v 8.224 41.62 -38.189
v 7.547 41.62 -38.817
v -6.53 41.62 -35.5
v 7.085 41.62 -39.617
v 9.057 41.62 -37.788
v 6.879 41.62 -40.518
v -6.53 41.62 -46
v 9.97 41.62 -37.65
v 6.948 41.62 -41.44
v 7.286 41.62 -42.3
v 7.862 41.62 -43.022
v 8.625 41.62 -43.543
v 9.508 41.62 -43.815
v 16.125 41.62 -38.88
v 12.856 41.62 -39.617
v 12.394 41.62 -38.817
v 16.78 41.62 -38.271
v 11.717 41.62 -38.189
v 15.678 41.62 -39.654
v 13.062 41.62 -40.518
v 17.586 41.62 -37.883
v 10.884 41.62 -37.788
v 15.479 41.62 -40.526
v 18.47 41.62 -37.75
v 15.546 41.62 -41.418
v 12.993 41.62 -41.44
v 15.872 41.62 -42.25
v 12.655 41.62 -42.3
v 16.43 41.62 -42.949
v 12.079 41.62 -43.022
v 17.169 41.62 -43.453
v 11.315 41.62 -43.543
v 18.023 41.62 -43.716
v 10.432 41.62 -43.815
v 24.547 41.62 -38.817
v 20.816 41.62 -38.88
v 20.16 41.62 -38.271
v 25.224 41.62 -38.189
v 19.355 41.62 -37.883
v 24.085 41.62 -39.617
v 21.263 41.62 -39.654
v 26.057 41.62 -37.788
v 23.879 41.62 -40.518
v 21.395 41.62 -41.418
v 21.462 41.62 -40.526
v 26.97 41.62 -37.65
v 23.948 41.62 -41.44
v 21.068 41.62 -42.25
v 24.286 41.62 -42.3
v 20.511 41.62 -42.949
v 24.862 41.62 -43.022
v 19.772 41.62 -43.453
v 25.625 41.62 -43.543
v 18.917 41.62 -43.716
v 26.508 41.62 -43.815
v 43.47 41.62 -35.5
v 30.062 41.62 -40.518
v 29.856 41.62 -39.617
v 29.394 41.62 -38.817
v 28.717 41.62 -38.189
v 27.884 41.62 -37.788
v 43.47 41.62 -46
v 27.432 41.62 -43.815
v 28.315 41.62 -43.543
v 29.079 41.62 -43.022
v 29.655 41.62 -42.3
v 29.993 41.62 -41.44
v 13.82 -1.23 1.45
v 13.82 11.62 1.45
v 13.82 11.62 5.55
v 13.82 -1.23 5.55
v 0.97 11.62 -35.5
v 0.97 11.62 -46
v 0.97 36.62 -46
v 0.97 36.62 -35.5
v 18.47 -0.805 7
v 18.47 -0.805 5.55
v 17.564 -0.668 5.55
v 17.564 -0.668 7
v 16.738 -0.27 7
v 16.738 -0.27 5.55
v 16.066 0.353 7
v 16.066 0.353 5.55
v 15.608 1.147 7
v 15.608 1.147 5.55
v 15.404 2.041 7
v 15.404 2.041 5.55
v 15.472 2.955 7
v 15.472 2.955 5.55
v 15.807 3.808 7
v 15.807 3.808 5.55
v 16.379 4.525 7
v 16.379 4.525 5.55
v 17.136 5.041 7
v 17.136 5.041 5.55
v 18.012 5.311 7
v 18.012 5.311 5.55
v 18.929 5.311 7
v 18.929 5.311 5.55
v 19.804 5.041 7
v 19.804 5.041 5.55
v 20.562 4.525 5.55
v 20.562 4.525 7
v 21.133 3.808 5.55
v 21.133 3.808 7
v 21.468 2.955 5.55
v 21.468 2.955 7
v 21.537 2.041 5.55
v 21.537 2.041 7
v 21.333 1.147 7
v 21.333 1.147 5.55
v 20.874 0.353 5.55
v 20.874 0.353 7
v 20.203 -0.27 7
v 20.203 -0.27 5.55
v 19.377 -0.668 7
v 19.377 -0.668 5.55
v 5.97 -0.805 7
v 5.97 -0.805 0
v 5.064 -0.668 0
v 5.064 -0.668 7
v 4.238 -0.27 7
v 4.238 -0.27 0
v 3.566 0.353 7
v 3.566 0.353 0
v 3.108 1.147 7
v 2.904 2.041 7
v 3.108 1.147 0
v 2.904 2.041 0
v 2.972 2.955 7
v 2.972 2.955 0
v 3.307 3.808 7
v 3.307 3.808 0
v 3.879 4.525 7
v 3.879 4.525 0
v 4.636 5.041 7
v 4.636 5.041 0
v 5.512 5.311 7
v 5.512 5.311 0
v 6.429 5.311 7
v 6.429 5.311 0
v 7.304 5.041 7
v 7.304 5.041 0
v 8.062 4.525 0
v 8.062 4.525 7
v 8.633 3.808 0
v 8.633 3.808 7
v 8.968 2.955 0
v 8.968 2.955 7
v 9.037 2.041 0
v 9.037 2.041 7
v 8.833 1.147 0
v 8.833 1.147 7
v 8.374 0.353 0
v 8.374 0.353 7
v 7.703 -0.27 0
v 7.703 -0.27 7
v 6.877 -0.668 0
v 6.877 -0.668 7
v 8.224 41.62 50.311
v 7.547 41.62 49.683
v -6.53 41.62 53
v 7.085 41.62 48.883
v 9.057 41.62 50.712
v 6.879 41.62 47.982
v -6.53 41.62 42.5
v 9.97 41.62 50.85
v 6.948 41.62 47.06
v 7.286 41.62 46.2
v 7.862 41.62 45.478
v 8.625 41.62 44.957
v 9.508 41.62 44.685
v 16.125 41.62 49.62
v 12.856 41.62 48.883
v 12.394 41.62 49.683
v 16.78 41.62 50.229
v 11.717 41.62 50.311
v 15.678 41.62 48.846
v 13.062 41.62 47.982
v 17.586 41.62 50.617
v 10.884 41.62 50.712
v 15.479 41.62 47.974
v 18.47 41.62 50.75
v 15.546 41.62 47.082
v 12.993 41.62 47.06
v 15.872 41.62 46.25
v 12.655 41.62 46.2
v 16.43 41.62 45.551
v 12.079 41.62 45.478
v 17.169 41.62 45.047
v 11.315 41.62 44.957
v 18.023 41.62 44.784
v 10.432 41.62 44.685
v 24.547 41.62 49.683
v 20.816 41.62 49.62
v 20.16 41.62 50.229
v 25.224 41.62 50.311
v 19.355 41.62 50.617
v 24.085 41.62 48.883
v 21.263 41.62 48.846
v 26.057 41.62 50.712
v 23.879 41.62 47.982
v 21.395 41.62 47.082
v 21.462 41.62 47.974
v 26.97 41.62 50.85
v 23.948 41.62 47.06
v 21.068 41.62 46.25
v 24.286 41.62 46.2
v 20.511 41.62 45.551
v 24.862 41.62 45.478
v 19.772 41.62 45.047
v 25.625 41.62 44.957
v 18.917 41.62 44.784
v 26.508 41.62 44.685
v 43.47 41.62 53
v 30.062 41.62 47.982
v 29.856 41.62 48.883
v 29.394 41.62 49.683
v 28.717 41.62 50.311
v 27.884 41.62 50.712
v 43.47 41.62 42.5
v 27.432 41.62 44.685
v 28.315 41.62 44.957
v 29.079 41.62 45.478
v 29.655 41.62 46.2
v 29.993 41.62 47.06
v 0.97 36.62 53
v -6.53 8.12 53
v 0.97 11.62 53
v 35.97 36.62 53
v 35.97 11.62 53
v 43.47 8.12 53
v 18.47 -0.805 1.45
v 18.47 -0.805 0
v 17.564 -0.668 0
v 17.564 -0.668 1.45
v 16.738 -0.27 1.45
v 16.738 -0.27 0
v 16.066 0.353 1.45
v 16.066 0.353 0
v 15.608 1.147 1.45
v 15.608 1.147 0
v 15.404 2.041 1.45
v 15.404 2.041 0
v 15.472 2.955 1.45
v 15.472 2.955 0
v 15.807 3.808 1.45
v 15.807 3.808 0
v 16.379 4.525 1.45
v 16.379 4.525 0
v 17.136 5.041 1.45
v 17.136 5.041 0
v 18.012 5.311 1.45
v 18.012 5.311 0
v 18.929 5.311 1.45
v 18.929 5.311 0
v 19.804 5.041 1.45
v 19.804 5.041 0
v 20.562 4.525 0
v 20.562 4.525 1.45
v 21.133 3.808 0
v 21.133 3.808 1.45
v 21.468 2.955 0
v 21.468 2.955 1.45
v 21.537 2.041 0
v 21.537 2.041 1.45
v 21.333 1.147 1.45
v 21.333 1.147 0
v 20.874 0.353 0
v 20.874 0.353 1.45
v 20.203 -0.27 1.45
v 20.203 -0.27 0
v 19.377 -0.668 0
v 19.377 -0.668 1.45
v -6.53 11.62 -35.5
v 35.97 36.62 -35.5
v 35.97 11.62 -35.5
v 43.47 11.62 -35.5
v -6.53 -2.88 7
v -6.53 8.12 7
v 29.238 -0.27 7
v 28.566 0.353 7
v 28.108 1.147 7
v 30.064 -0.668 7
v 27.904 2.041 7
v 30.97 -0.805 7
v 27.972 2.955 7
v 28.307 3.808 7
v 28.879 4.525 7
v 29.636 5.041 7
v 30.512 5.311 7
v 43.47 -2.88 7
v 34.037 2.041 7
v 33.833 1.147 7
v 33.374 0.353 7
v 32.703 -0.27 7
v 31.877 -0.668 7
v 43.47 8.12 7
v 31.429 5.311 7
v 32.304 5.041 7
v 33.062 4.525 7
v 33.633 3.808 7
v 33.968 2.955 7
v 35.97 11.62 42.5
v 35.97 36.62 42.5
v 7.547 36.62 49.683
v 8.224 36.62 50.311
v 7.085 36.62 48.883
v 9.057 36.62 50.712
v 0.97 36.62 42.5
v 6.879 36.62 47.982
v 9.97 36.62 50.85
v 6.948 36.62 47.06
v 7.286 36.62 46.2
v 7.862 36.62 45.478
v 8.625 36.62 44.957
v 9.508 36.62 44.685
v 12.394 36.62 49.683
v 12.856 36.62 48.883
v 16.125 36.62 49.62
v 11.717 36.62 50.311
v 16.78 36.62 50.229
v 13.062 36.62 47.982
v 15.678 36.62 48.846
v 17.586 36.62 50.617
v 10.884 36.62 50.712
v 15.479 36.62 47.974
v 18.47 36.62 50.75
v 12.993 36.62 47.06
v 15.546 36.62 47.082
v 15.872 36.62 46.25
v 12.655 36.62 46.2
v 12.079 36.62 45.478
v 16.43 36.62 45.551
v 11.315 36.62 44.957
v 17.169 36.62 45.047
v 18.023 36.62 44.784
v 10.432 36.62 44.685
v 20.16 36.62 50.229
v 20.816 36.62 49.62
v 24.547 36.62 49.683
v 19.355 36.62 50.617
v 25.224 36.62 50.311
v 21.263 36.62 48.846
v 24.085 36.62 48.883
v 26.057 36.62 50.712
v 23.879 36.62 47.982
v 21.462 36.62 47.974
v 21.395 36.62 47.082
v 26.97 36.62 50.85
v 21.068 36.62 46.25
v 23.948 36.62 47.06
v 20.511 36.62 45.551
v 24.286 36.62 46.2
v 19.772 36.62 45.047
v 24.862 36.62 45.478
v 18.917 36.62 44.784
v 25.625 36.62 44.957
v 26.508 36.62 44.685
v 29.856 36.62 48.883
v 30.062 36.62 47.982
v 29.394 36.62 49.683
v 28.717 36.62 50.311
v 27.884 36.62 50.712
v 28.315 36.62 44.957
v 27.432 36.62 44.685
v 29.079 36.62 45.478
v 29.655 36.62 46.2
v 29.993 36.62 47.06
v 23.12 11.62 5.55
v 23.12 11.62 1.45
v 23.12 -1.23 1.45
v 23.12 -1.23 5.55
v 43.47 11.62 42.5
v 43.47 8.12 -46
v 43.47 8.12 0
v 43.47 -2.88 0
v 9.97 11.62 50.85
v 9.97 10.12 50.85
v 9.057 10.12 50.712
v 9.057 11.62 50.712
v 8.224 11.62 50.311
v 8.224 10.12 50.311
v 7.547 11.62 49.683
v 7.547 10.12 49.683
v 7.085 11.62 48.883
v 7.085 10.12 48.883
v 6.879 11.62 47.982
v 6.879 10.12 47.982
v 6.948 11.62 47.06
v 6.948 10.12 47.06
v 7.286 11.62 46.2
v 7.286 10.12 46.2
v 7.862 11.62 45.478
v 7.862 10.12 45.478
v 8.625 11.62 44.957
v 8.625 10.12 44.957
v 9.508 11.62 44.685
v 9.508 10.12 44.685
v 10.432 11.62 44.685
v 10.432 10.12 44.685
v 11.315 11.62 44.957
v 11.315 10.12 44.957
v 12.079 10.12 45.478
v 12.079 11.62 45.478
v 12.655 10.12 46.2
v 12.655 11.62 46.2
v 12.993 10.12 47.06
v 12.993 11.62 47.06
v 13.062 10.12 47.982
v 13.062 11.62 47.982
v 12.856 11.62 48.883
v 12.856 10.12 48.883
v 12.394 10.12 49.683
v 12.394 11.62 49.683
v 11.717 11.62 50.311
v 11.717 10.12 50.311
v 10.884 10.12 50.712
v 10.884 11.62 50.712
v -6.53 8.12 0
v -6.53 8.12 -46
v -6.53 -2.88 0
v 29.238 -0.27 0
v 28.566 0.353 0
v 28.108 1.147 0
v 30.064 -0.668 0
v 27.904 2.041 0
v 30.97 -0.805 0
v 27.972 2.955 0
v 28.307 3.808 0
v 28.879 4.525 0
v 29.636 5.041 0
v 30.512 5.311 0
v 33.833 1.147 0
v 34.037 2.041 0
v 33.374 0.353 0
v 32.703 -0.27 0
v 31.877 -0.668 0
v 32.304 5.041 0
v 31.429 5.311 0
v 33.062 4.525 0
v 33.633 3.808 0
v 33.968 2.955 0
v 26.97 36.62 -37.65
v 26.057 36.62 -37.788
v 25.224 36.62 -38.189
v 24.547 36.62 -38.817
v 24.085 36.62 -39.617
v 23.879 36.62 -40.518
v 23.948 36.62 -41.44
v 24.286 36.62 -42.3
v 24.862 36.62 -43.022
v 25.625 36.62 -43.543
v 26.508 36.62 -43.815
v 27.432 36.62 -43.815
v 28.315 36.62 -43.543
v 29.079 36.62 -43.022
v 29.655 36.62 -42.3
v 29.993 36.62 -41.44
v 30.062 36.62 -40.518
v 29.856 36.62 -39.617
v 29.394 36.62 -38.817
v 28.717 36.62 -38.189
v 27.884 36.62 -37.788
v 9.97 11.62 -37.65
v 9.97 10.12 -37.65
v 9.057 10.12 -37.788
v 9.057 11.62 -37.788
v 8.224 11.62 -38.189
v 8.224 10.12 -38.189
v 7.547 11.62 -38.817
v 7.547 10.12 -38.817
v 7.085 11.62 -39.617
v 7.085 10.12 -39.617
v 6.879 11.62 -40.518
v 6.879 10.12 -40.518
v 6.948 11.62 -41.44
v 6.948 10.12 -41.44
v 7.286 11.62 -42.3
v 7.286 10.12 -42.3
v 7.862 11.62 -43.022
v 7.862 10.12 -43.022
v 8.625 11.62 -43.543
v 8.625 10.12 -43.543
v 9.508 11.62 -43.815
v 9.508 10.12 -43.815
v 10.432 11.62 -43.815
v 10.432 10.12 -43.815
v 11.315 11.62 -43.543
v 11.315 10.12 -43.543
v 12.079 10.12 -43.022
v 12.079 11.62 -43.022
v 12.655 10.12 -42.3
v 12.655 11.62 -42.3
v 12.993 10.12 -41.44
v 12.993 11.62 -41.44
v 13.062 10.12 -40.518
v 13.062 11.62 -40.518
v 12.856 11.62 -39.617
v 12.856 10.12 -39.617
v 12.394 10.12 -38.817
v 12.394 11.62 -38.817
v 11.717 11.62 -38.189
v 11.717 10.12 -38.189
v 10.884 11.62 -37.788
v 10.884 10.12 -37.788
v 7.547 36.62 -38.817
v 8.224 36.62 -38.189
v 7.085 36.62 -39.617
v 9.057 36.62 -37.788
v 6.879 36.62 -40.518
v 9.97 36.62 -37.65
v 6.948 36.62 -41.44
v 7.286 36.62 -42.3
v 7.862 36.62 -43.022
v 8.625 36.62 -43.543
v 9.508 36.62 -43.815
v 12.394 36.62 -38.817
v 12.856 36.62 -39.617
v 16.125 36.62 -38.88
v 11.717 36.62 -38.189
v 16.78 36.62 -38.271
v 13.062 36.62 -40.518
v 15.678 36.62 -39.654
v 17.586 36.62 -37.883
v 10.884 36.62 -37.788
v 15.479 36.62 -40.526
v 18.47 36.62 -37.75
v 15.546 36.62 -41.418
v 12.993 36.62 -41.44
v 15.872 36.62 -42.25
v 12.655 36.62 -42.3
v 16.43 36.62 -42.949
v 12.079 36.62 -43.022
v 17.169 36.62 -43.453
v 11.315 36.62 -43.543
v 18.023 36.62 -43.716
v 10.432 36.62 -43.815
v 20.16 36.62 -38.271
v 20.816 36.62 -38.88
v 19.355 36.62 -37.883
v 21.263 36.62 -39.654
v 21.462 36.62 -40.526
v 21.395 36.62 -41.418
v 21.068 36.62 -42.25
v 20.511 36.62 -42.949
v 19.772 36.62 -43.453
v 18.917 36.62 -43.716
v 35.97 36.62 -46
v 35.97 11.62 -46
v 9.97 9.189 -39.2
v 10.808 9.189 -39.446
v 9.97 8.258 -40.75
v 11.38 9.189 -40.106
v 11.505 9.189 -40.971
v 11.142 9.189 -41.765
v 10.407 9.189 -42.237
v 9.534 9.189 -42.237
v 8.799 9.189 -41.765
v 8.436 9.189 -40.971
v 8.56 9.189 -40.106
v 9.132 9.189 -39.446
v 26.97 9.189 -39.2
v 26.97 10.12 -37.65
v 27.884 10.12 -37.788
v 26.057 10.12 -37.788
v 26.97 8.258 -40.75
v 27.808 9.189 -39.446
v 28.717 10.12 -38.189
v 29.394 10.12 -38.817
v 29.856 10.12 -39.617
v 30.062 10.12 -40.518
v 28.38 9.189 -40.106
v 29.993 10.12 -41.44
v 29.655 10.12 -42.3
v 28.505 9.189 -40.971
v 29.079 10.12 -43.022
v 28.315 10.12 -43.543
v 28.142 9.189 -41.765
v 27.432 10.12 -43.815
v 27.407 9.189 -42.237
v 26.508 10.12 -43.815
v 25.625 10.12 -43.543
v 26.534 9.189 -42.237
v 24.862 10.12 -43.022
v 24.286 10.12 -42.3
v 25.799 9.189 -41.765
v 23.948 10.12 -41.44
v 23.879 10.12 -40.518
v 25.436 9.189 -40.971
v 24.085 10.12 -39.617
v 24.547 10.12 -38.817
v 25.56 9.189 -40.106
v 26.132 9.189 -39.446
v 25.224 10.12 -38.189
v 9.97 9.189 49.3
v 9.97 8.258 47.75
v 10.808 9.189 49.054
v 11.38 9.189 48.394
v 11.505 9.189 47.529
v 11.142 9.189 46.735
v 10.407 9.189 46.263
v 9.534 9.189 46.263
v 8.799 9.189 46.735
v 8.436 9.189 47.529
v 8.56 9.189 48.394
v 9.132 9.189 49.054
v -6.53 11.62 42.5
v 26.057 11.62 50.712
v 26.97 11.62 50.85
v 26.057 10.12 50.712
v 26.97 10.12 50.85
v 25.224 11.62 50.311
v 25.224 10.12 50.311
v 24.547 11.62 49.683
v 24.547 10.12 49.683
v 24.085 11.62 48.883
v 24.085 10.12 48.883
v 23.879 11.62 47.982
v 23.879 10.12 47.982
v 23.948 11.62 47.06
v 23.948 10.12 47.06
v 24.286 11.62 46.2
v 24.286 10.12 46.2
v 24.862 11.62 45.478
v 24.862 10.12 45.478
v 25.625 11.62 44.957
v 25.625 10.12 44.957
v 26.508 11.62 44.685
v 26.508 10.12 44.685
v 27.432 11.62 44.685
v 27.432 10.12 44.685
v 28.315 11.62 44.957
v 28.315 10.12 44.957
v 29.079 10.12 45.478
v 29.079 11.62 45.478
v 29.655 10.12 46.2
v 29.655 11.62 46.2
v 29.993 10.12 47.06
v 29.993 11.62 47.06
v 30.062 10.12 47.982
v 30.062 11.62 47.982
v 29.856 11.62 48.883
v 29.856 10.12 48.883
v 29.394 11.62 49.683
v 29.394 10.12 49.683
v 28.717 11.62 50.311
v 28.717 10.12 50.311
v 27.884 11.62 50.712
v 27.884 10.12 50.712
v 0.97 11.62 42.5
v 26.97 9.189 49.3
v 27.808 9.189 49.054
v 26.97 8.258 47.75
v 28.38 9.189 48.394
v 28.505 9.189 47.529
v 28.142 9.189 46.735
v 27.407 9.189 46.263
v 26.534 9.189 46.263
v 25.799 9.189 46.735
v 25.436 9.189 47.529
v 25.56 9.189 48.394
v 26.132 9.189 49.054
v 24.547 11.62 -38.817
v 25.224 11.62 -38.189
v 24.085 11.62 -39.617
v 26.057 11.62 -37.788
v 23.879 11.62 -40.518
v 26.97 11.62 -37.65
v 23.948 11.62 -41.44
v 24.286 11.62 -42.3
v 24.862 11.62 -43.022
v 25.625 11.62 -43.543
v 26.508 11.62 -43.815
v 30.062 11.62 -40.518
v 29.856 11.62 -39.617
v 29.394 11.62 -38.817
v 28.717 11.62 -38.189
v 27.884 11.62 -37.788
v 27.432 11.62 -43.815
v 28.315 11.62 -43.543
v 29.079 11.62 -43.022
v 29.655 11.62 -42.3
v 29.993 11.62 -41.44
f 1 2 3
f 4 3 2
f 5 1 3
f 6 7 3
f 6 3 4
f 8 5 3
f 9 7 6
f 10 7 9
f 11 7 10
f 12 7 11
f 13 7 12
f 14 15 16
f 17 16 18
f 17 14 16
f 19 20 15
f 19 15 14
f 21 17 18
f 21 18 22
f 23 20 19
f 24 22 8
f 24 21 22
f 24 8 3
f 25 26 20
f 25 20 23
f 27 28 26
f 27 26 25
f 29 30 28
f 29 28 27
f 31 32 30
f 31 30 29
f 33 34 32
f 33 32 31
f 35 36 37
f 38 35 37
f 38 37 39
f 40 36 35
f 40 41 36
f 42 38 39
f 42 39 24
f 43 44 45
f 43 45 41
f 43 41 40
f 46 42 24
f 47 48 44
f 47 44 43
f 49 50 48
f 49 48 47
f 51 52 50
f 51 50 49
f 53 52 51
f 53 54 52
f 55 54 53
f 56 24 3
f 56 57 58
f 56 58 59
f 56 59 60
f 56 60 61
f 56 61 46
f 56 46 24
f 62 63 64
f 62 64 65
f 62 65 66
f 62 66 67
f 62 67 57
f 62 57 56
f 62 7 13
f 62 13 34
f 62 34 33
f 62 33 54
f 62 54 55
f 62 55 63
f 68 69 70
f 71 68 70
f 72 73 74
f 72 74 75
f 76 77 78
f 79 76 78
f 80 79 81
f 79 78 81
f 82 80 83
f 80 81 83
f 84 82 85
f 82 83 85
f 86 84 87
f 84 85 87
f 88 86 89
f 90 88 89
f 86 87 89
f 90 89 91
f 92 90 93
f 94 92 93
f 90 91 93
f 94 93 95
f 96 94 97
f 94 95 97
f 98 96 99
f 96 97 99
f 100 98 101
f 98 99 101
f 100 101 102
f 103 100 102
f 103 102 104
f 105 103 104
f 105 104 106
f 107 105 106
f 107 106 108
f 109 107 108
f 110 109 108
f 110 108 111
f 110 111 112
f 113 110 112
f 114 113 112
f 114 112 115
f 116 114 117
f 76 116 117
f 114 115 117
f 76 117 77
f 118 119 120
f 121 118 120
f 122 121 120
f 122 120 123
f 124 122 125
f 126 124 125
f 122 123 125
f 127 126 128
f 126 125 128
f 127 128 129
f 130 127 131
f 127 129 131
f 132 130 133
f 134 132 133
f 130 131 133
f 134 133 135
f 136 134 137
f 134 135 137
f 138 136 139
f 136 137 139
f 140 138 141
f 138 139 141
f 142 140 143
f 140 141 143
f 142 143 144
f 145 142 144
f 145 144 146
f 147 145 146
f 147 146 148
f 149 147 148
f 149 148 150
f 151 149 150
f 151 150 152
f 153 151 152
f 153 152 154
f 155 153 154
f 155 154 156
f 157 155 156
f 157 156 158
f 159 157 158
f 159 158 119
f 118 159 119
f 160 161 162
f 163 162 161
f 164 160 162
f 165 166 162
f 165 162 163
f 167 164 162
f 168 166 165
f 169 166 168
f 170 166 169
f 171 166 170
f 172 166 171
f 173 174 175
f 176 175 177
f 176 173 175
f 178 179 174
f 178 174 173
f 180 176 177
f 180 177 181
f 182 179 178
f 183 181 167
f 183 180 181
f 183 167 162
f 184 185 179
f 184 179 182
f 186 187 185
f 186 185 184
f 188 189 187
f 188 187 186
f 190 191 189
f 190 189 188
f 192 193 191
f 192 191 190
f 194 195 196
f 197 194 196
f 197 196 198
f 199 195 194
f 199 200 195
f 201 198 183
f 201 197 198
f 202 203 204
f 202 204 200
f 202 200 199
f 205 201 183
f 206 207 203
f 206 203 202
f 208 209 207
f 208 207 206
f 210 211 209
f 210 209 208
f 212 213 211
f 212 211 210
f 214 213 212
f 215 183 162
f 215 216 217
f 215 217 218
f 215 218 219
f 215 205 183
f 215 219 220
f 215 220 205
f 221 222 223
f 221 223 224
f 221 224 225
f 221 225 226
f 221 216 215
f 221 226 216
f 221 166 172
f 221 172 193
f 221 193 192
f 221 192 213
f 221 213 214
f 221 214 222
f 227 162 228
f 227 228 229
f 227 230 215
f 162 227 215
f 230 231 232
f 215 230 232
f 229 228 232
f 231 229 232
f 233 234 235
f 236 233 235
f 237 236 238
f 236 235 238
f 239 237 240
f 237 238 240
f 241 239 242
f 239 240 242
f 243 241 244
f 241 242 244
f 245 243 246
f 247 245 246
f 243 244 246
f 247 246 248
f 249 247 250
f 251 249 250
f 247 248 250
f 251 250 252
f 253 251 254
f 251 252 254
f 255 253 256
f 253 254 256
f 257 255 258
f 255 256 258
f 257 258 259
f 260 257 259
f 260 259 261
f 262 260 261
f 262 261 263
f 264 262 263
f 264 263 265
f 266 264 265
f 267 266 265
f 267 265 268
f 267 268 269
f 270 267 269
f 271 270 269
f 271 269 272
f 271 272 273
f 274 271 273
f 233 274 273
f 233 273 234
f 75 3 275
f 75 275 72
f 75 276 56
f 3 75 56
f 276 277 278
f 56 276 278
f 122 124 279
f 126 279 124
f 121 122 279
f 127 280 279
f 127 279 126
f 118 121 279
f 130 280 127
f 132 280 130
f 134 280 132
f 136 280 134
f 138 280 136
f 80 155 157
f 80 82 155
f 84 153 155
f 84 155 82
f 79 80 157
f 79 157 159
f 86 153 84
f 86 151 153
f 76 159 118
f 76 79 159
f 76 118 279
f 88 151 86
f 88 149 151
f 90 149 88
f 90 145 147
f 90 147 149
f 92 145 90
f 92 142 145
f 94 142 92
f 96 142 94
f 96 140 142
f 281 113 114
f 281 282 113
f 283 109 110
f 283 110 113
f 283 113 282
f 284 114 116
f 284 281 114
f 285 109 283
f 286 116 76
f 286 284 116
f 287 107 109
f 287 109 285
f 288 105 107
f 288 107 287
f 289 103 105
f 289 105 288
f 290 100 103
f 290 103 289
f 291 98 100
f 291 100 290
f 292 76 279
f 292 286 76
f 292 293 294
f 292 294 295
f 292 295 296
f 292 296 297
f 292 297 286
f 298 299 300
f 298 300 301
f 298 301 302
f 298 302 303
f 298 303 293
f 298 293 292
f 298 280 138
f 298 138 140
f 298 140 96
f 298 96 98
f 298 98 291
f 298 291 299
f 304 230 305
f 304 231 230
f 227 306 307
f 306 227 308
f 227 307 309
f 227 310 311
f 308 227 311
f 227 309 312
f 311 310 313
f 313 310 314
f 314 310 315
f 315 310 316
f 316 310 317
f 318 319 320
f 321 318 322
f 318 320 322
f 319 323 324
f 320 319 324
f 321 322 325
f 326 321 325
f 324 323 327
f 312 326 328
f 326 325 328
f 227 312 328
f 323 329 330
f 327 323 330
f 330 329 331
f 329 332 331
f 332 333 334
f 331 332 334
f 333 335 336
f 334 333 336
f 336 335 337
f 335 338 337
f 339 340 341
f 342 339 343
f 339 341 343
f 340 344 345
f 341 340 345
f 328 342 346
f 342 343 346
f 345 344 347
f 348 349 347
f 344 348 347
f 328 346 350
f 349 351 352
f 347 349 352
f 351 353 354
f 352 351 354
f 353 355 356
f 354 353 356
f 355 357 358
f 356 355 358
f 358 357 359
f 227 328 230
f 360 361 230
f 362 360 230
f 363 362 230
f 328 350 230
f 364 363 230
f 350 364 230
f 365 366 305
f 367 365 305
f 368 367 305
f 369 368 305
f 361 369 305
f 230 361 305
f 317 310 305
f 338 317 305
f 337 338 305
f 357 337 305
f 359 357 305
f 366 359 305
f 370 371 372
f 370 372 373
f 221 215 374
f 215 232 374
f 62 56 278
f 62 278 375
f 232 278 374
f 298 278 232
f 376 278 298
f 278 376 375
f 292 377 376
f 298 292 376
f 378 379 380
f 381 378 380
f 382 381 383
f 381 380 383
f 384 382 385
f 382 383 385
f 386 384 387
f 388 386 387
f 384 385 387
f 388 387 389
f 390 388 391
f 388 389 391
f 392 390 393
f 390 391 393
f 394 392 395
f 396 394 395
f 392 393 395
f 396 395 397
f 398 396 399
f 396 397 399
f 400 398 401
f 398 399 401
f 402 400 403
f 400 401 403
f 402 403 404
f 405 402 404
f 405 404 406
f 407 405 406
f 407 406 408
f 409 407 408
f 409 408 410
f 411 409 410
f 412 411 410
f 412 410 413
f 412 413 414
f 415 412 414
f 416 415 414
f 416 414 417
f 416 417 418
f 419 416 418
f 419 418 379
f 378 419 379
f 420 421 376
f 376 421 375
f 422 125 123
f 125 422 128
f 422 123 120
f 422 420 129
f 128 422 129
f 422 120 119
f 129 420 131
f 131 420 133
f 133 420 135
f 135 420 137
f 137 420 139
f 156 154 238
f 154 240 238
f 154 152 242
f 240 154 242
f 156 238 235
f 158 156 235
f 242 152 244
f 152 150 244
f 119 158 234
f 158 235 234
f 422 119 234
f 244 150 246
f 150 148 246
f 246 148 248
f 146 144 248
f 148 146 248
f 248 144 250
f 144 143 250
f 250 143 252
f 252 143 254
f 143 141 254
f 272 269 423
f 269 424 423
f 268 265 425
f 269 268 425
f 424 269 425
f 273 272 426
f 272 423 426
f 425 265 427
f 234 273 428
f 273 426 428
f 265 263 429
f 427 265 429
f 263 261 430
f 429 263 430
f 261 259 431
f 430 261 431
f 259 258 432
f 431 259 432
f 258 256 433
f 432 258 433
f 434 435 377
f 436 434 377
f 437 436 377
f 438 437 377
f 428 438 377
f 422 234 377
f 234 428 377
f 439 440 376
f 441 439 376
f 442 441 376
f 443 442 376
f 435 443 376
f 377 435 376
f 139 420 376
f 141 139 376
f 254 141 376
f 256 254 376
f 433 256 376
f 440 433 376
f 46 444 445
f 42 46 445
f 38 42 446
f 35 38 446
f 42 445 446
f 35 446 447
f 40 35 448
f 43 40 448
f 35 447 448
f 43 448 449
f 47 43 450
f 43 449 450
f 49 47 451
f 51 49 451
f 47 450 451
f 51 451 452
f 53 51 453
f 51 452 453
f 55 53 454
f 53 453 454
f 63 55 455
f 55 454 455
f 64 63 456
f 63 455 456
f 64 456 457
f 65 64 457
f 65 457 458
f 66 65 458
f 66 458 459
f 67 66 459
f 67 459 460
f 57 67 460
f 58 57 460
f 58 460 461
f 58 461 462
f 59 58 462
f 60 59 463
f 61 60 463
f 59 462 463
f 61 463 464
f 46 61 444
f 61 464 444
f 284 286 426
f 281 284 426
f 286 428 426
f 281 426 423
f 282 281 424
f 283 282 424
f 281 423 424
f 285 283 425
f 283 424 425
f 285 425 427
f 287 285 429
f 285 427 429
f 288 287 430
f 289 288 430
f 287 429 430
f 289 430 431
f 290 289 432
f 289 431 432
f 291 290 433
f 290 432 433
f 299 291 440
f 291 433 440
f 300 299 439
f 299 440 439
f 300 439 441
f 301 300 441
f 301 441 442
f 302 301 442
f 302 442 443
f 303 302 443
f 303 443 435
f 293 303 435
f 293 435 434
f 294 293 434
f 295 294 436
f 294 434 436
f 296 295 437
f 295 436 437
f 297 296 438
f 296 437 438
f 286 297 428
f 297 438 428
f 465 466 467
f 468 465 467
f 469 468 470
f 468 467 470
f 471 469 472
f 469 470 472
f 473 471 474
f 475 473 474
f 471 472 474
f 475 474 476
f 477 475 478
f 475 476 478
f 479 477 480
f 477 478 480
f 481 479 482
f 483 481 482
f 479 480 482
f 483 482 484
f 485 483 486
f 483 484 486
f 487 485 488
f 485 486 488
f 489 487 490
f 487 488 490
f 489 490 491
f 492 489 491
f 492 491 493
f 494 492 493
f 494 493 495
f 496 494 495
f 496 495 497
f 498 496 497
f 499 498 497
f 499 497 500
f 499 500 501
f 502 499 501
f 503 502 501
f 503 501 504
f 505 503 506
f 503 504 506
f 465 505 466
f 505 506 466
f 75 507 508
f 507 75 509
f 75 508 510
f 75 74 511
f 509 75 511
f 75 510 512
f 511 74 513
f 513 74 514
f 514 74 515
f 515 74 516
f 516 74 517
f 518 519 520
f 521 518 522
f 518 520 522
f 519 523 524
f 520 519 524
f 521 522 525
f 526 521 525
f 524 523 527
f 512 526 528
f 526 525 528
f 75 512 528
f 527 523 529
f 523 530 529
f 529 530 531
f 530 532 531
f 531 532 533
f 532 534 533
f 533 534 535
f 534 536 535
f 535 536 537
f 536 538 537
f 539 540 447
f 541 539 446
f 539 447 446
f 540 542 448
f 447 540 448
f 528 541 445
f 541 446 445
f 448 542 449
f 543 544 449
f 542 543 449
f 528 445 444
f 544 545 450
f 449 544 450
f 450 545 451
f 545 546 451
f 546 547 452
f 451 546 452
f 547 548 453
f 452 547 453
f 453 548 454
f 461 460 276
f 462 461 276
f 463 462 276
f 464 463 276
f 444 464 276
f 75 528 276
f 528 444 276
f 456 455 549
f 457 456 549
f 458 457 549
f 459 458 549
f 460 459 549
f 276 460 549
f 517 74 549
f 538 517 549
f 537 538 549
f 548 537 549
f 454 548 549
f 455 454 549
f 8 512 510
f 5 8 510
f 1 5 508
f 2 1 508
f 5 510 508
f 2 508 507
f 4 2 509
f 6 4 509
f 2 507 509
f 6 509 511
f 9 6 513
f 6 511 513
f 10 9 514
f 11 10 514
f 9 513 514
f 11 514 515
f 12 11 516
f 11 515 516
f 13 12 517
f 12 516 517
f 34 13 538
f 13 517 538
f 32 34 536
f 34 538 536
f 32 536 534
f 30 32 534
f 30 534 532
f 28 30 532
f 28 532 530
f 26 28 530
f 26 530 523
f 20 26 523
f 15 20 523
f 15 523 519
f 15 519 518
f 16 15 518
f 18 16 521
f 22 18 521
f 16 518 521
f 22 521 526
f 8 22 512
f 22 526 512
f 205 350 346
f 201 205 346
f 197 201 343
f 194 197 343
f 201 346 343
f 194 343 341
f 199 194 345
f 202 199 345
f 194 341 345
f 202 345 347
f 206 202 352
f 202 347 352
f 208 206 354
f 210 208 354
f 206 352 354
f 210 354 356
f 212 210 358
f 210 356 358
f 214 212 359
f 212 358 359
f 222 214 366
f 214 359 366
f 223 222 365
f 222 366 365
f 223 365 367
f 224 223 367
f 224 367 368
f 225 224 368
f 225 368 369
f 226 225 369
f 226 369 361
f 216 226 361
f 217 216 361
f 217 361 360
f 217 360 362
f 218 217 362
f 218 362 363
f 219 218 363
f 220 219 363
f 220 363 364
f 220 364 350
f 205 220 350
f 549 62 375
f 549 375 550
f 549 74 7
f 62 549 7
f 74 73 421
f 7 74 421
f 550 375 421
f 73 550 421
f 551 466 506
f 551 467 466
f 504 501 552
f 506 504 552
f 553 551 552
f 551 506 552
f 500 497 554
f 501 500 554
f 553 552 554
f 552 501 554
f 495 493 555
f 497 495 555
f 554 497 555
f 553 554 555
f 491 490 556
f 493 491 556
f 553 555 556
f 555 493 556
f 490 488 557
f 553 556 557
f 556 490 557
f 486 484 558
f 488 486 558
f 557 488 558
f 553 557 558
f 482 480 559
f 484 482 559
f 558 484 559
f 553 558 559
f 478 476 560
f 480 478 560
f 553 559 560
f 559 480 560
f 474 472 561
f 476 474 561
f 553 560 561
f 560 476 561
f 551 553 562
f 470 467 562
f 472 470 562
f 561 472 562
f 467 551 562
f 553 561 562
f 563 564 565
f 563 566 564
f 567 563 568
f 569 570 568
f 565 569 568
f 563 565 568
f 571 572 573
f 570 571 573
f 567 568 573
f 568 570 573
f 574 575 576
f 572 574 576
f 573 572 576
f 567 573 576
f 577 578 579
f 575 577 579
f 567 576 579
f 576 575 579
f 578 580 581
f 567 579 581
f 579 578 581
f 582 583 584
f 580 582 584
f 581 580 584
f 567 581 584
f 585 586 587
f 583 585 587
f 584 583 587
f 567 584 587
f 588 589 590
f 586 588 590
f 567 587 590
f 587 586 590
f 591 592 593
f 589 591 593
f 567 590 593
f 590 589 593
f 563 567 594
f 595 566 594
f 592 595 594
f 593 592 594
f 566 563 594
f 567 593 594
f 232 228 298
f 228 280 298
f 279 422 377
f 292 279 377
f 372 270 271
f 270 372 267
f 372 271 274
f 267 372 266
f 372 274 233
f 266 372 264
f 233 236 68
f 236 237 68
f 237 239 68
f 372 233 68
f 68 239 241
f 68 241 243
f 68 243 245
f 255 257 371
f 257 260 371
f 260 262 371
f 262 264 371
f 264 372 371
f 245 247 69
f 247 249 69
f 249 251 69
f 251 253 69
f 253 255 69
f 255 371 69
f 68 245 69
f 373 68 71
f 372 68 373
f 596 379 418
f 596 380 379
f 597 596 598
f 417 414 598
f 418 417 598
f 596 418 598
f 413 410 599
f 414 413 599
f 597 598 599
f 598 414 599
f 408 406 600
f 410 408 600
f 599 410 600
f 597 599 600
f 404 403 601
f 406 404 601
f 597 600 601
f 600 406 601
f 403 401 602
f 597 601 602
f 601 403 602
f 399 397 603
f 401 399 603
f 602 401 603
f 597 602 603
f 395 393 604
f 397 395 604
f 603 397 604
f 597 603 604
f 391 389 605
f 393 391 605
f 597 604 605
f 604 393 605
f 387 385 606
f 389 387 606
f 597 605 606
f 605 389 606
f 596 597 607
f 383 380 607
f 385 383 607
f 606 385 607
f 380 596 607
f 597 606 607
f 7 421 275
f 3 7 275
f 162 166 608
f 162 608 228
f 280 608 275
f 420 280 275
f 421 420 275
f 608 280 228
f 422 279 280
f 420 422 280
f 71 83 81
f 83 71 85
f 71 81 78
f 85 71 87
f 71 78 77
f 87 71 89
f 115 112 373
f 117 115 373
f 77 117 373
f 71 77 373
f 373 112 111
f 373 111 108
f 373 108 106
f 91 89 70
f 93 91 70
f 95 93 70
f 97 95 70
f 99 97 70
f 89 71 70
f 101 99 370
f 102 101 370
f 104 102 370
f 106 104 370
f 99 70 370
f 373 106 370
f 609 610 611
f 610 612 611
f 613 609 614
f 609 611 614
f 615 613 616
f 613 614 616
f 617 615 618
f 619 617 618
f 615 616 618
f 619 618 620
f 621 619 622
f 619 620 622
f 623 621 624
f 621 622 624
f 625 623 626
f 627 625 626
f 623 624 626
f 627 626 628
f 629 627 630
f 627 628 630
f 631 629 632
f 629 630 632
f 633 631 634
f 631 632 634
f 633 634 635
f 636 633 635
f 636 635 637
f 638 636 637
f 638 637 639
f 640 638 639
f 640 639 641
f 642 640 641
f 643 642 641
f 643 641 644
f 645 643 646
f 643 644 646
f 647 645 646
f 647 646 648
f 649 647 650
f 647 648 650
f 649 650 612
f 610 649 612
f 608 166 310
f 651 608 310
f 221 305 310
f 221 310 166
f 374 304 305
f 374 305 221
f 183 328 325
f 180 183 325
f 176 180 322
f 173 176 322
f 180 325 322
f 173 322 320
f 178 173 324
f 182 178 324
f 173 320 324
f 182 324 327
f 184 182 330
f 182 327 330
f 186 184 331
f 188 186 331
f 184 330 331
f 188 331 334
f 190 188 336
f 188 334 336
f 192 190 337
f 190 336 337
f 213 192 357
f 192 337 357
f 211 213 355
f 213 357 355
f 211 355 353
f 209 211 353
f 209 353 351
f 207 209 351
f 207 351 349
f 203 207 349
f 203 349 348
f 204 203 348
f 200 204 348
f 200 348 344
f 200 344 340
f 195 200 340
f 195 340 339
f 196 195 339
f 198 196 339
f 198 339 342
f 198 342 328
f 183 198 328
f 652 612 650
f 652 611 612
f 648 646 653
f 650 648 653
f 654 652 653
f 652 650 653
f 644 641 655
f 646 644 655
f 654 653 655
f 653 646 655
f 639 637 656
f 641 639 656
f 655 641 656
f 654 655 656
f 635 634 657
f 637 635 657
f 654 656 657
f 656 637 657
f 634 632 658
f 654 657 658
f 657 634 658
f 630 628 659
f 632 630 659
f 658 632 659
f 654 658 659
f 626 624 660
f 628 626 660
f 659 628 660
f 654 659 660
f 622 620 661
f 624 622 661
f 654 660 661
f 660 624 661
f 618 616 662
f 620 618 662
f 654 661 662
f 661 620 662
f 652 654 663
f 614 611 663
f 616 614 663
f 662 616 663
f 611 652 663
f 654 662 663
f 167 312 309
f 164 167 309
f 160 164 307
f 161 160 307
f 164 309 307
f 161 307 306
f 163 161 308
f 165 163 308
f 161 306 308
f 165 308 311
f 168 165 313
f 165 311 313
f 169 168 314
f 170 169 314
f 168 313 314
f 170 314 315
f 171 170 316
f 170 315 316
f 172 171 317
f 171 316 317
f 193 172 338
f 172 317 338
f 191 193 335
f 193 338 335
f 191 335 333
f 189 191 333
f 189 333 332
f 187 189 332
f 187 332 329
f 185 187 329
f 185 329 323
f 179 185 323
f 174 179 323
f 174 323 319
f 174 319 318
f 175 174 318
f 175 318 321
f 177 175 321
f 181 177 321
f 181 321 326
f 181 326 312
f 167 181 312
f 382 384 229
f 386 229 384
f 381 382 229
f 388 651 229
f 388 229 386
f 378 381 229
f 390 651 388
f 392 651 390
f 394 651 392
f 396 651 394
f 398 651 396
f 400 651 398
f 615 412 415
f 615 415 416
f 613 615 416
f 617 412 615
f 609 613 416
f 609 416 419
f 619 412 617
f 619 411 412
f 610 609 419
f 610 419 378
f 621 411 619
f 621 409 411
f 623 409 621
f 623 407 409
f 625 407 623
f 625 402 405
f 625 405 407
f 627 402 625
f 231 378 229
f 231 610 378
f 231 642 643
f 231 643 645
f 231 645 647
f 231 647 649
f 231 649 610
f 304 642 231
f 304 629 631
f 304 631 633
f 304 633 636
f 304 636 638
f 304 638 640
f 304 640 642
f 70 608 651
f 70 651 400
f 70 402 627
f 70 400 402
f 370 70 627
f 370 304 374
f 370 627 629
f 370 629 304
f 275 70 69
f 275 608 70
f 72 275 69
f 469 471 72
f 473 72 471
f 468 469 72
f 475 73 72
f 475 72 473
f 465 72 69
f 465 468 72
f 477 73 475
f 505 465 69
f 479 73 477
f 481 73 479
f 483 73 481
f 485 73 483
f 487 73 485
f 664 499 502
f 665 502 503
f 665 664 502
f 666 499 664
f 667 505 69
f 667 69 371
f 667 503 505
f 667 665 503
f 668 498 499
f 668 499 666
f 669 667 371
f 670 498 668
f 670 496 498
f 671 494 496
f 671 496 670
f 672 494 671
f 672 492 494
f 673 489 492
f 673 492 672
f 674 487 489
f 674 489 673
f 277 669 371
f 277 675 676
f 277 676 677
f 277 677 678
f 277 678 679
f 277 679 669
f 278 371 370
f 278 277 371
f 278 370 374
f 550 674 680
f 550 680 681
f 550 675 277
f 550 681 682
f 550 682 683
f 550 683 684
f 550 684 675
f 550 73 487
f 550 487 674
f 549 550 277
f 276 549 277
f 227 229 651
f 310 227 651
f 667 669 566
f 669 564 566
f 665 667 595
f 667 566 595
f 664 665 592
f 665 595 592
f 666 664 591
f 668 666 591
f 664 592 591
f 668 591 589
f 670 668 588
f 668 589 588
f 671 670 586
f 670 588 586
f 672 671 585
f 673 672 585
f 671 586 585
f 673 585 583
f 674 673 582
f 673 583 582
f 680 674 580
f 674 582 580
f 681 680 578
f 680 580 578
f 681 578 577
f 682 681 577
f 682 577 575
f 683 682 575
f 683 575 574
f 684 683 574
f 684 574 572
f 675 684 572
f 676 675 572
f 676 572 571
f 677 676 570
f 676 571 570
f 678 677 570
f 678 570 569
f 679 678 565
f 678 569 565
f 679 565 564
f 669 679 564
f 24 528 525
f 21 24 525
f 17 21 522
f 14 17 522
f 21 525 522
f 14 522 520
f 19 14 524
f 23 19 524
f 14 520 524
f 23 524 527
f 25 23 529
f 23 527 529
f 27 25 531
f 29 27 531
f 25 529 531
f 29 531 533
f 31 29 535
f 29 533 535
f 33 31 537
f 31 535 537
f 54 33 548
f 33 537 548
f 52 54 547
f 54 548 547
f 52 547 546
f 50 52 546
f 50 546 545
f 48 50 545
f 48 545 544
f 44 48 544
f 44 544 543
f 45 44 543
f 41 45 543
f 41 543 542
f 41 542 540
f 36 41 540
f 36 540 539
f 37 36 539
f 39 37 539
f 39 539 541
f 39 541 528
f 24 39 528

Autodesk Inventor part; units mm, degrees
ref_plane "YZ Plane" through (0, 0, 0) normal (1, 0, 0) x (0, 1, 0)
ref_plane "XZ Plane" through (0, 0, 0) normal (0, 1, 0) x (-1, 0, 0)
ref_plane "XY Plane" through (0, 0, 0) normal (0, 0, 1) x (1, 0, 0)
sketch "Skizze1" plane through (0, 0, 0) normal (0, 0, 1) x (1, 0, 0)
  line L0 (-6.5297, -2.8796) -> (43.4703, -2.8796)
  line L1 (43.4703, -2.8796) -> (43.4703, 8.1204)
  line L2 (43.4703, 8.1204) -> (-6.5297, 8.1204)
  line L3 (-6.5297, 8.1204) -> (-6.5297, -2.8796)
  point P0 (0, 0)
  dimension "d0" = 50
  dimension "d1" = 11
extrude "Extrusion1" add sketch "Skizze1" along normal blind 7
sketch "Skizze2" plane through (-6.5297, 8.1204, 0) normal (0, 1, 0) x (1, 0, 0)
  line L0 (29.65, -5.55) -> (20.35, -5.55)
  line L1 (20.35, -5.55) -> (20.35, -1.45)
  line L2 (20.35, -1.45) -> (29.65, -1.45)
  line L3 (29.65, -1.45) -> (29.65, -5.55)
  line L4 (50, -7) -> (0, -7) projected
  line L5 (50, 0) -> (50, -7) projected
  line L6 (0, 0) -> (0, -7) projected
  point P0 (6.5297, 0)
  dimension "d4" = 9.3
  dimension "d5" = 4.1
  dimension "d6" = 1.45
  dimension "d7" = 20.35
  dimension "d8" = 20.35
extrude "Extrusion2" cut sketch "Skizze2" against normal blind 9.35
sketch "Skizze3" plane through (0, 0, 7) normal (0, 0, 1) x (1, 0, 0)
  line L0 (-6.5297, 8.1204) -> (-6.5297, -2.8796) projected
  line L1 (43.4703, 8.1204) -> (-6.5297, 8.1204) projected
  point P0 (0, 0)
  point P1 (5.9703, 2.2704)
  point P2 (18.4703, 2.2704)
  point P3 (30.9703, 2.2704)
  dimension "d11" = 12.5
  dimension "d12" = 12.5
  dimension "d13" = 12.5
  dimension "d14" = 5.85
hole "Bohrung1" at (5.9703, 2.2704, 7) at (18.4703, 2.2704, 7) at (30.9703, 2.2704, 7) direction (0, 0, -1) diameter 6.15 end through all
sketch "Skizze4" plane through (-6.5297, 8.1204, 0) normal (0, 1, 0) x (1, 0, 0)
  point P0 (6.5297, 0)
sketch "Skizze5" plane through (-6.5297, 8.1204, 0) normal (0, 1, 0) x (1, 0, 0)
  line L0 (50, 0) -> (0, 0) projected
  line L1 (0, 0) -> (0, -53.0037)
  line L2 (0, -53) -> (50, -53)
  line L3 (50, -53) -> (50, 46)
  line L4 (50, 46) -> (0, 46)
  line L5 (0, 46) -> (0, -53)
  point P0 (6.5297, 0)
  dimension "d22" = 50
  dimension "d23" = 99
  dimension "d24" = 46
extrude "Extrusion3" add sketch "Skizze5" along normal blind 3.5
sketch "Skizze6" plane through (-6.5297, 11.6204, 0) normal (0, 1, 0) x (1, 0, 0)
  line L0 (29.65, -1.45) -> (29.65, -5.55) projected
  line L1 (29.65, -1.45) -> (20.35, -1.45)
  line L2 (20.35, -1.45) -> (20.35, -5.55)
  line L3 (20.35, -5.55) -> (29.65, -5.55)
  line L4 (29.65, -5.55) -> (29.65, -1.45)
  point P0 (6.5297, 0)
extrude "Extrusion4" cut sketch "Skizze6" against normal blind 3.5
sketch "Skizze7" plane through (-6.5297, 11.6204, 0) normal (0, 1, 0) x (1, 0, 0)
  line L0 (0, -53) -> (50, -53) projected
  line L1 (50, -53) -> (42.5, -53)
  line L2 (42.5, -53) -> (42.5, -42.5)
  line L3 (42.5, -42.5) -> (50, -42.5)
  line L4 (50, -42.5) -> (50, -53)
  line L5 (0, -53) -> (7.5, -53)
  line L6 (7.5, -53) -> (7.5, -42.5)
  line L7 (7.5, -42.5) -> (0, -42.5)
  line L8 (0, -42.5) -> (0, -53)
  line L9 (0, 46) -> (0, -53) projected
  line L10 (0, 46) -> (7.5, 46)
  line L11 (7.5, 46) -> (7.5, 35.5)
  line L12 (7.5, 35.5) -> (0, 35.5)
  line L13 (0, 35.5) -> (0, 46)
  line L14 (50, -53) -> (50, 46) projected
  line L15 (50, 46) -> (42.5, 46)
  line L16 (42.5, 46) -> (42.5, 35.5)
  line L17 (42.5, 35.5) -> (50, 35.5)
  line L18 (50, 35.5) -> (50, 46)
  point P0 (6.5297, 0)
  dimension "d29" = 7.5
  dimension "d30" = 10.5
  dimension "d31" = 7.5
  dimension "d32" = 10.5
  dimension "d33" = 7.5
  dimension "d34" = 10.5
  dimension "d35" = 7.5
  dimension "d36" = 10.5
extrude "Extrusion5" add sketch "Skizze7" along normal blind 25
sketch "Skizze8" plane through (0.9703, 11.6204, -35.5) normal (1, 0, 0) x (0, 0, -1)
  point P0 (-35.5, -11.6204)
sketch "Skizze9" plane through (-6.5297, 36.6204, 0) normal (0, 1, 0) x (1, 0, 0)
  line L0 (50, -42.5) -> (50, 35.5) projected
  line L1 (0, 46) -> (50, 46)
  line L2 (50, 46) -> (50, 35.5)
  line L3 (50, 35.5) -> (0, 35.5)
  line L4 (0, 35.5) -> (0, 46)
  line L5 (50, -53) -> (50, -7) projected
  line L6 (0, -42.5) -> (50, -42.5)
  line L7 (50, -42.5) -> (50, -53)
  line L8 (50, -53) -> (0, -53)
  line L9 (0, -53) -> (0, -42.5)
  line L10 (50, -42.5) -> (42.5, -42.5) projected
  point P0 (6.5297, 0)
  dimension "d75" = 0
extrude "Extrusion6" add sketch "Skizze9" along normal blind 5
sketch "Skizze10" plane through (-6.5297, 41.6204, 0) normal (0, 1, 0) x (1, 0, 0)
  line L0 (50, 46) -> (0, 46) projected
  line L1 (0, -53) -> (50, -53) projected
  line L2 (42.5, -42.5) -> (42.5, -53) projected
  line L3 (42.5, 46) -> (42.5, 35.5) projected
  line L4 (7.5, 35.5) -> (7.5, 46) projected
  line L5 (7.5, -53) -> (7.5, -42.5) projected
  point P0 (6.5297, 0)
  point P1 (15.7518, 40.75)
  point P2 (25, 40.75)
  point P3 (33.5, 40.75)
  point P4 (15.6745, -47.75)
  point P5 (25, -47.75)
  point P6 (33.5, -47.75)
  dimension "d41" = 5.25
  dimension "d42" = 5.25
  dimension "d43" = 5.25
  dimension "d44" = 5.25
  dimension "d45" = 5.25
  dimension "d46" = 5.25
  dimension "d47" = 9
  dimension "d50" = 9
  dimension "d76" = 17.5
  dimension "d77" = 17.5
hole "Bohrung2" at (18.4703, 41.6204, 47.75) at (18.4703, 41.6204, -40.75) direction (0, -1, 0) diameter 6 depth 10 tip angle 118
sketch "Skizze11" plane through (-6.5297, 41.6204, 0) normal (0, 1, 0) x (1, 0, 0)
  line L0 (7.5, -53) -> (7.5, -42.5) projected
  line L1 (42.5, -42.5) -> (42.5, -53) projected
  line L2 (50, -42.5) -> (0, -42.5) projected
  line L3 (50, 46) -> (0, 46) projected
  line L4 (42.5, 46) -> (42.5, 35.5) projected
  line L5 (7.5, 35.5) -> (7.5, 46) projected
  point P0 (6.5297, 0)
  point P1 (16.5, -47.75)
  point P2 (33.5, -47.75)
  point P3 (16.5, 40.75)
  point P4 (33.5, 40.75)
  dimension "d60" = 9
  dimension "d61" = 9
  dimension "d62" = 5.25
  dimension "d63" = 5.25
  dimension "d64" = 5.25
  dimension "d65" = 5.25
  dimension "d66" = 9
  dimension "d67" = 9
hole "Bohrung3" at (9.9703, 41.6204, 47.75) at (26.9703, 41.6204, 47.75) at (9.9703, 41.6204, -40.75) at (26.9703, 41.6204, -40.75) direction (0, -1, 0) diameter 6.2 depth 31.5 tip angle 118
sketch "Skizze12" plane through (-6.5297, -2.8796, 0) normal (0, -1, 0) x (1, 0, 0)
  point P0 (6.5297, 0)
properties part number "Objektträgerhalter 1 Neu"
